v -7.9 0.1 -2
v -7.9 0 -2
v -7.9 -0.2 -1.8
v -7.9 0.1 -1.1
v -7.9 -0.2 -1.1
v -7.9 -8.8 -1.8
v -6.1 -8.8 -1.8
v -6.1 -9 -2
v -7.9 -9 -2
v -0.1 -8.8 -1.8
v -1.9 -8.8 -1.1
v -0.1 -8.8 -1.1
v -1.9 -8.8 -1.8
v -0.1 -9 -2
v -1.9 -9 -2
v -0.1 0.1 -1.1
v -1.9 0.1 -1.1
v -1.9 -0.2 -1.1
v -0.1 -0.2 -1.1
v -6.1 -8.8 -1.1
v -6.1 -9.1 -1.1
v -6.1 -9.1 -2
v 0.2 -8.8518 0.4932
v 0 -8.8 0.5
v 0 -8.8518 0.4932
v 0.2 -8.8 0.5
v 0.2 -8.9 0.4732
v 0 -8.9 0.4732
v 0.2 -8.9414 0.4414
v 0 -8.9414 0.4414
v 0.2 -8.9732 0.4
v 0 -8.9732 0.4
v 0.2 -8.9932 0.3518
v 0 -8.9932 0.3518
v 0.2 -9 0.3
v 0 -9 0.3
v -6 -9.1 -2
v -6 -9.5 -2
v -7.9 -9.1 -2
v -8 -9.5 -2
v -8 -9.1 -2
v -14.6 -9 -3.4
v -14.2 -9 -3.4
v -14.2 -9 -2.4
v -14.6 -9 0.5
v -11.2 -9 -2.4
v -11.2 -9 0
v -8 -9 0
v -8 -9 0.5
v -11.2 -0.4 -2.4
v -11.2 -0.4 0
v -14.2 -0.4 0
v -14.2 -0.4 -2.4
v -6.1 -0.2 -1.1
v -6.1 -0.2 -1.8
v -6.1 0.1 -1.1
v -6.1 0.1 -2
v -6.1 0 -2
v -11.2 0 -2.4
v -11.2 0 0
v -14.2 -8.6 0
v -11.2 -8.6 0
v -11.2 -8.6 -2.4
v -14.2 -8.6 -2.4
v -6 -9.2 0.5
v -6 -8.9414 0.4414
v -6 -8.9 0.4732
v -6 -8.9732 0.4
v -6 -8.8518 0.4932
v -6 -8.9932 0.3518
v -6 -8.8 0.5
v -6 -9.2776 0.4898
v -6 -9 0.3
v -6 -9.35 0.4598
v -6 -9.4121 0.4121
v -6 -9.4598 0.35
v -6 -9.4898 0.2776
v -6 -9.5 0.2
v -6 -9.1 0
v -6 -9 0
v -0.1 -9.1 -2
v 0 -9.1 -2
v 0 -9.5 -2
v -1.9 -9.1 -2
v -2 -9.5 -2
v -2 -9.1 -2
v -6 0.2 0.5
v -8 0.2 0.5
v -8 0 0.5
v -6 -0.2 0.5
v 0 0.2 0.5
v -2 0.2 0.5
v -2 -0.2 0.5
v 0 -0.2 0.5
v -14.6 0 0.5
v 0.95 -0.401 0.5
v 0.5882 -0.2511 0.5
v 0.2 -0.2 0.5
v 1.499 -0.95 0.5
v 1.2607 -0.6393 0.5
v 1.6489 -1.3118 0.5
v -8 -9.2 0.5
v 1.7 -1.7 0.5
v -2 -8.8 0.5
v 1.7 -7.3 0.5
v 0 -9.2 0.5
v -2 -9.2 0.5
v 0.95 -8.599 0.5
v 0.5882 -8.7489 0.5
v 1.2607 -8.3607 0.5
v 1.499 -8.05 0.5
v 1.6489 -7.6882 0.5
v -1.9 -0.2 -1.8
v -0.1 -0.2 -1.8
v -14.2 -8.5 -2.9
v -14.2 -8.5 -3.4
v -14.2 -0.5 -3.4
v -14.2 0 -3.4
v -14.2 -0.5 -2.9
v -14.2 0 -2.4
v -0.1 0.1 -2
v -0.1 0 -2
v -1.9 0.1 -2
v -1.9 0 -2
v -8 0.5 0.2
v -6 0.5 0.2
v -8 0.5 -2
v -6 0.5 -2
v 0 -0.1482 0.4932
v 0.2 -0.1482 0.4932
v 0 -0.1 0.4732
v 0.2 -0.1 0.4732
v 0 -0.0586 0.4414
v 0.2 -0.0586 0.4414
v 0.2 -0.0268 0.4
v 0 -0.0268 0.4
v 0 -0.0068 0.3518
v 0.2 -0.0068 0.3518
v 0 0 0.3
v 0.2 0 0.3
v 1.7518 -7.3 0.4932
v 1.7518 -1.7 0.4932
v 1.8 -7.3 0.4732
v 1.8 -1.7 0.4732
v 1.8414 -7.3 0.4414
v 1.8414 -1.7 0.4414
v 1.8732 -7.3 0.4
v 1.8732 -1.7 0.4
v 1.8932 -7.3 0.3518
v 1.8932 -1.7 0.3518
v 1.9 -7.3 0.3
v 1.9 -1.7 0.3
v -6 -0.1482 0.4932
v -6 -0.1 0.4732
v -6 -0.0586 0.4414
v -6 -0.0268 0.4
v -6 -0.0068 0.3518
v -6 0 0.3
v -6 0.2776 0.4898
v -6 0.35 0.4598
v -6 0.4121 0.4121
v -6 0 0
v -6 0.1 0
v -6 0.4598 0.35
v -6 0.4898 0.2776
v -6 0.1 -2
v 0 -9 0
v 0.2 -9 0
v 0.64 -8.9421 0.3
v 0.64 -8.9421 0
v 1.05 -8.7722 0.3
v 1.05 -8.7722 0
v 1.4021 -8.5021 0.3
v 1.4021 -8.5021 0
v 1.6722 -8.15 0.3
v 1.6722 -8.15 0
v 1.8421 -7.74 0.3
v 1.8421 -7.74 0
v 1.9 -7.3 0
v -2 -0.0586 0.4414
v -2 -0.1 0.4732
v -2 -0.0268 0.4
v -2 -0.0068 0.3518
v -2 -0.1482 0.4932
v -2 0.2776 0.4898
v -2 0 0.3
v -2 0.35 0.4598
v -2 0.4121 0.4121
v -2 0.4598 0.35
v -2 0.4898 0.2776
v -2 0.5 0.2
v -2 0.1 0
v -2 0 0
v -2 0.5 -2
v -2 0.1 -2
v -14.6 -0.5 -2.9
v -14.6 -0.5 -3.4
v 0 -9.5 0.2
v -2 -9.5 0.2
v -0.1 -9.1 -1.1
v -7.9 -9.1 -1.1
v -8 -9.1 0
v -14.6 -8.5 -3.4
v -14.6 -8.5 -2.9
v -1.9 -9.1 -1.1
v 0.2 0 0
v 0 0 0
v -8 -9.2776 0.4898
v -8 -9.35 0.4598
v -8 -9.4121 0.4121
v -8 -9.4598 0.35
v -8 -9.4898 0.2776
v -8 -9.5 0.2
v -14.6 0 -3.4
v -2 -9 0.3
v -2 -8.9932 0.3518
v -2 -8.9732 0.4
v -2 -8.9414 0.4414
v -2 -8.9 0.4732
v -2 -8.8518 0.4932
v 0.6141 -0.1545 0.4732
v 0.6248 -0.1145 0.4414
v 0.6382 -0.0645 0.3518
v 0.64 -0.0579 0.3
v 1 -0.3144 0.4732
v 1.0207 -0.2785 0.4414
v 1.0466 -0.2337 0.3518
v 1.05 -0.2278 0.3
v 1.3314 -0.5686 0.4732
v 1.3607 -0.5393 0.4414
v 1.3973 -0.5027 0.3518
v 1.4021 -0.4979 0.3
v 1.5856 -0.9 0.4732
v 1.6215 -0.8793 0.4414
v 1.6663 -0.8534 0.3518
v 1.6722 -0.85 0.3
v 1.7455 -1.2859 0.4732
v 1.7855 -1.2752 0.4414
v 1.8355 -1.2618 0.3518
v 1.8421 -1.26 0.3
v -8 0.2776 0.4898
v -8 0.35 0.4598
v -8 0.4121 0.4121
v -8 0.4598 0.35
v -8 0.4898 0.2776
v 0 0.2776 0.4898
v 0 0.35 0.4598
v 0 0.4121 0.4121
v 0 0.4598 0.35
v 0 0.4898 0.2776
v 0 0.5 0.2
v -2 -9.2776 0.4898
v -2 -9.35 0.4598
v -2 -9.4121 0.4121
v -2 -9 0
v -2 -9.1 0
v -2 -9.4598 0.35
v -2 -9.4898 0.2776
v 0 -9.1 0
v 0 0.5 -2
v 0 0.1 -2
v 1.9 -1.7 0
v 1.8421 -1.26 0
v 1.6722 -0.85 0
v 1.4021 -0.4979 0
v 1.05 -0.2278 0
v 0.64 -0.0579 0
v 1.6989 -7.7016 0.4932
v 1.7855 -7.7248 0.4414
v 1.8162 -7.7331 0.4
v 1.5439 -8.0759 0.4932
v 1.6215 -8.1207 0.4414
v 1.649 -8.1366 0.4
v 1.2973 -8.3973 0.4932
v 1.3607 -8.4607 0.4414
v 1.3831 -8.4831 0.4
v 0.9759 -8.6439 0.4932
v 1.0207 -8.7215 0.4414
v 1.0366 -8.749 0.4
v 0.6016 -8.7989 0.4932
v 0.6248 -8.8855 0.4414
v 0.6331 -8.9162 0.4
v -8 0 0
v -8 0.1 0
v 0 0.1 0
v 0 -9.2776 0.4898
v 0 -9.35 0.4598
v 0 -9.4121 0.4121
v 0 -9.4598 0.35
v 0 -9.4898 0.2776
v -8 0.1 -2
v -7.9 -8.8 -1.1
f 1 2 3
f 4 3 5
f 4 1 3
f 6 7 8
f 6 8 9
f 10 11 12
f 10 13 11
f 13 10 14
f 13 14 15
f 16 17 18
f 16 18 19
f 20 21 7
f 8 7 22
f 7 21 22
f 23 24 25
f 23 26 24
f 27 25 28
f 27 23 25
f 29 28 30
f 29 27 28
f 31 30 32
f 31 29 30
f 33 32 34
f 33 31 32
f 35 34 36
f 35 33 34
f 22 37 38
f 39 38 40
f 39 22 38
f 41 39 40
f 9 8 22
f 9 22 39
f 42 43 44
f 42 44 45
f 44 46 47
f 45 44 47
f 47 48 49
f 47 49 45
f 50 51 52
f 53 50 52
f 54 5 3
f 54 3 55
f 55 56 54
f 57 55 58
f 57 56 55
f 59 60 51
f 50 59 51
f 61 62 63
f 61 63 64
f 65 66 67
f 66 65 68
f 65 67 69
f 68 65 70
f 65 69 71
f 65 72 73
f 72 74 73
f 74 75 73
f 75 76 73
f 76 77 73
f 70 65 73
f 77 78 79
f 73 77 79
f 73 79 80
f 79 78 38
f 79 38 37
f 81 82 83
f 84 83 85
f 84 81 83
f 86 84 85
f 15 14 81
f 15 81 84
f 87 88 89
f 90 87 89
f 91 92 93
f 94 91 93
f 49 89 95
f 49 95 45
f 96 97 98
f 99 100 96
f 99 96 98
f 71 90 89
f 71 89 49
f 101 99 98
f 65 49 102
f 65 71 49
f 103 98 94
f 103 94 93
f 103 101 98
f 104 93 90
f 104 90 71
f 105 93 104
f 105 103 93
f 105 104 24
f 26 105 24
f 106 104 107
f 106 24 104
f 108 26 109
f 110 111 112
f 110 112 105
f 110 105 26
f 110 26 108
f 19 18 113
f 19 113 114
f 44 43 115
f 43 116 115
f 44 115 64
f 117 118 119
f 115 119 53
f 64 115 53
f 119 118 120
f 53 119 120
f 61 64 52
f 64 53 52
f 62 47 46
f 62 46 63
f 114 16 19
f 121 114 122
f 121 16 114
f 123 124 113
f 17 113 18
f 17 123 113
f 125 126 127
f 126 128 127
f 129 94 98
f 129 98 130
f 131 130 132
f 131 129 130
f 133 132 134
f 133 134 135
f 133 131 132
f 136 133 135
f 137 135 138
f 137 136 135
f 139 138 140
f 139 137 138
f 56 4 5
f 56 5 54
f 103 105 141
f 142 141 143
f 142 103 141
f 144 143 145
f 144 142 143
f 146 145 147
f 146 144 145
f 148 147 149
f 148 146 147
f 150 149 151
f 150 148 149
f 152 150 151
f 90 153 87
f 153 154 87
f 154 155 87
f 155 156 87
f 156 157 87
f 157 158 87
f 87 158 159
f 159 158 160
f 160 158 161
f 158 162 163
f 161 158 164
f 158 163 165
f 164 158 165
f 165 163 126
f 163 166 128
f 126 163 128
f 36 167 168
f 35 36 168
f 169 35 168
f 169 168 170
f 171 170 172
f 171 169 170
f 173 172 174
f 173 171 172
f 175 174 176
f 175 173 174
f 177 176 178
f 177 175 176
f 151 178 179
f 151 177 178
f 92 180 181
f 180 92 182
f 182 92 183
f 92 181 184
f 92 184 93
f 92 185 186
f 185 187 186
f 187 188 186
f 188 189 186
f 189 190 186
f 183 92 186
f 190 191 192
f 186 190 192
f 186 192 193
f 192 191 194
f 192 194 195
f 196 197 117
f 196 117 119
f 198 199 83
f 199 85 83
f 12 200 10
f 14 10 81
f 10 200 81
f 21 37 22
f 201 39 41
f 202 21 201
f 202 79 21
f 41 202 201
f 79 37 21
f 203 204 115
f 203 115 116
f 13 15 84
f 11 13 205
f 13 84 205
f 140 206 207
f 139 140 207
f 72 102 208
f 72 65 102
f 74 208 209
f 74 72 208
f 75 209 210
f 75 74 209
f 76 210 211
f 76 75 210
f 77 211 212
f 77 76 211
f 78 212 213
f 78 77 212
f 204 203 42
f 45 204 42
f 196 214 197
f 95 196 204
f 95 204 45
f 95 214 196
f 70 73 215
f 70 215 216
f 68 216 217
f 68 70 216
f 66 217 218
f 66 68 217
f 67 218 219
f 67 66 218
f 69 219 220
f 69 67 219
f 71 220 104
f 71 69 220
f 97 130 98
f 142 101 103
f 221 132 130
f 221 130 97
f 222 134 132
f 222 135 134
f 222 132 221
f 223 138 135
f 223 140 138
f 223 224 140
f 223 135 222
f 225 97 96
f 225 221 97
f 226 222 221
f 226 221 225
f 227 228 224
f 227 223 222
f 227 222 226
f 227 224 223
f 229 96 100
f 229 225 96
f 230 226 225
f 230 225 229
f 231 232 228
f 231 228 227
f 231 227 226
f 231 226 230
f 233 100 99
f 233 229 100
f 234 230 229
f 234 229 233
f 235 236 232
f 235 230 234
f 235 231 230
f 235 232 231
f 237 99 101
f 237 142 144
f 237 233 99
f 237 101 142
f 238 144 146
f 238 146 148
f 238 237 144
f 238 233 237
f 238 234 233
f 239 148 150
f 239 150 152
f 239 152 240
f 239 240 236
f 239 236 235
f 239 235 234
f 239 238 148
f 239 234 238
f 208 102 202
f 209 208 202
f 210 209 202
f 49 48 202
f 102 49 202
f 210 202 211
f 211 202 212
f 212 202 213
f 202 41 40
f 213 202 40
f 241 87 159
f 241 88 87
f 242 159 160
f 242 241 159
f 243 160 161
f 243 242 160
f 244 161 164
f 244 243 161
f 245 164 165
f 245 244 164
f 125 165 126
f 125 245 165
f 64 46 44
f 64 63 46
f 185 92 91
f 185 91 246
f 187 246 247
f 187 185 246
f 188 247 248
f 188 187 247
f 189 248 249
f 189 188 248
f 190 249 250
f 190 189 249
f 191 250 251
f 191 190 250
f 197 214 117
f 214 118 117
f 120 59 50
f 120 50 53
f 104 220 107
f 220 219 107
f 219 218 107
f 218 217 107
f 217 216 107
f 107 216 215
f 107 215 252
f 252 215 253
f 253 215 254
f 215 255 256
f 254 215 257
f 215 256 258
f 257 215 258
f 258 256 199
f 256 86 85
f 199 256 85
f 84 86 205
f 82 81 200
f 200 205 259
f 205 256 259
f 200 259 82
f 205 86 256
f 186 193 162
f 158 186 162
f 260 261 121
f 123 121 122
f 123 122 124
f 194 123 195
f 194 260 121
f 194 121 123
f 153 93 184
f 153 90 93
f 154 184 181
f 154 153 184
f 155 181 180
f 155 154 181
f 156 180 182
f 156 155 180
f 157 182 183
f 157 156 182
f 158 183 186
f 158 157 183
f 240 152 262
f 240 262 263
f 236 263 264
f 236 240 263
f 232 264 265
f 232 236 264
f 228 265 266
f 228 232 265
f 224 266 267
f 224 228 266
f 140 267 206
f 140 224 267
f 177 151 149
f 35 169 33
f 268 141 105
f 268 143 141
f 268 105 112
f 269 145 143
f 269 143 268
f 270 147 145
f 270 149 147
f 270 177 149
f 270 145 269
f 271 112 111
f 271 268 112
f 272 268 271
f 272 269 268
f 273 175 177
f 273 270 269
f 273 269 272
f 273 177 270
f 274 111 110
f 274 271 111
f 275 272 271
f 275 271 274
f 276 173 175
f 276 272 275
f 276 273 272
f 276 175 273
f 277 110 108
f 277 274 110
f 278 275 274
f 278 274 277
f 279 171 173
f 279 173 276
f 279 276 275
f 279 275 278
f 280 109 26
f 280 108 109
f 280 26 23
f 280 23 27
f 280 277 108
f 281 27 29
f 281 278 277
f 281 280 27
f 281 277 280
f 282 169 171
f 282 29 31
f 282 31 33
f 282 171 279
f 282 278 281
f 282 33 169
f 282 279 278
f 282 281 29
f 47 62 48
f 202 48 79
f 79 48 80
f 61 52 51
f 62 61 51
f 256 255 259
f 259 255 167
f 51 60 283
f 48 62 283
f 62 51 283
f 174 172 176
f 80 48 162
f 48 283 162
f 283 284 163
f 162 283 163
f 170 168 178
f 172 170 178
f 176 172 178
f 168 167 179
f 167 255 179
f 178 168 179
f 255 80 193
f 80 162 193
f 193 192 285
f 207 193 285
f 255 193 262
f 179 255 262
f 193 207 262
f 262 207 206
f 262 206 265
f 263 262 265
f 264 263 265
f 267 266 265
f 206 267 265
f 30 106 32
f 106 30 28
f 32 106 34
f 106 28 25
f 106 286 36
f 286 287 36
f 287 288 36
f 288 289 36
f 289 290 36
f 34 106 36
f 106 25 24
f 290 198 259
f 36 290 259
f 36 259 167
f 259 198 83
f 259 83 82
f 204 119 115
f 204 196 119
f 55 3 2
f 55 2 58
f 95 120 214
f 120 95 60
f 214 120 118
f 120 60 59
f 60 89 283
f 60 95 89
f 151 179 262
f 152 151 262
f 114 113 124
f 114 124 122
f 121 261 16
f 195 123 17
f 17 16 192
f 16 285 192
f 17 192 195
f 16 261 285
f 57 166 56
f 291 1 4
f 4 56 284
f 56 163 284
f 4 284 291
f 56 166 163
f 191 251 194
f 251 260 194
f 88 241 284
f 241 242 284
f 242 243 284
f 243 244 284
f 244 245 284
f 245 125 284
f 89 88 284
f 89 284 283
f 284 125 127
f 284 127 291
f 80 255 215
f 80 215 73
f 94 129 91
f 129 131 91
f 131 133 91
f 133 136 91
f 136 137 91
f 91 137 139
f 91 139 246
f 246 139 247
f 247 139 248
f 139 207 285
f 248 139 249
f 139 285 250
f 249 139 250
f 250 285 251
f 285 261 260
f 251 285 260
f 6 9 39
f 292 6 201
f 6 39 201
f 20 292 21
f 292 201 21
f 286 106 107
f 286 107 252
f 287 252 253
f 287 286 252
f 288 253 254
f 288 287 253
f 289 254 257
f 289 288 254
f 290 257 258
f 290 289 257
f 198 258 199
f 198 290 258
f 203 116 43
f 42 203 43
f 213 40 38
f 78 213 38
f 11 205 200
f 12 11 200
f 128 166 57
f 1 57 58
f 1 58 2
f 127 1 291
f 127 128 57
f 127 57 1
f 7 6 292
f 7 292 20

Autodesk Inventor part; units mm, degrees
ref_plane "Work Plane1" through (-1, 0, 0) normal (0, 0, 1) x (1, 0, 0)
sketch "Sketch1" plane through (-1, 0, 0) normal (0, 0, 1) x (1, 0, 0)
  line L0 (-7, 0) -> (-5, 0)
  line L1 (-5, 0) -> (-5, 0.5)
  line L2 (-5, 0.5) -> (-7, 0.5)
  line L3 (-7, 0.5) -> (-7, 0)
  line L4 (-5, 0) -> (-5, -0.4) projected
  line L5 (-7, 0) -> (-7, -0.4) projected
  line L6 (-1, 0) -> (-1, -0.4) projected
  line L7 (1, 0) -> (1, -0.4) projected
  line L8 (1, -8.6) -> (1, -9) projected
  line L9 (-1, -8.6) -> (-1, -9) projected
  line L10 (-5, -8.6) -> (-5, -9) projected
  line L11 (-7, -8.6) -> (-7, -9) projected
  line L12 (-7, -9.5) -> (-5, -9.5)
  line L13 (-5, -9.5) -> (-5, -9)
  line L14 (-5, -9) -> (-7, -9)
  line L15 (-7, -9) -> (-7, -9.5)
  line L16 (-1, -9.5) -> (1, -9.5)
  line L17 (1, -9.5) -> (1, -9)
  line L18 (1, -9) -> (-1, -9)
  line L19 (-1, -9) -> (-1, -9.5)
  line L20 (-1, 0) -> (1, 0)
  line L21 (1, 0) -> (1, 0.5)
  line L22 (1, 0.5) -> (-1, 0.5)
  line L23 (-1, 0.5) -> (-1, 0)
  line L24 (2.4038, -9) -> (-10, -9) projected
  line L25 (2.4038, 0) -> (-10, 0) projected
  line L26 (-13.2, -9) -> (2.9, -9)
  line L27 (2.9, -9) -> (2.9, 0)
  line L28 (2.9, 0) -> (-13.2, 0)
  line L29 (-13.2, 0) -> (-13.2, -9)
  line L30 (2.7, -2.7) -> (2.7, -1.9958) projected
  line L31 (-13, -9) -> (-13, -5.4522) projected
  point P0 (0.7, -9)
  point P1 (1, 0)
  point P2 (-1, 0)
  point P3 (-5, 0)
  point P4 (-7, 0)
  point P5 (1, 0)
  dimension "d89" = 0.5
  dimension "d90" = 0.2
  dimension "d125" = 0.2
extrude "main" add sketch "Sketch1" along normal blind 0.5
sketch "Sketch2" plane through (-1, 0, 0) normal (0, 0, -1) x (-1, 0, 0)
  line L0 (13, 0) -> (-2.4038, 0) projected
  line L1 (-2.4038, -9) -> (13, -9) projected
  line L2 (7, 0.5) -> (7, 0) projected
  line L3 (5, 0) -> (5, 0.5) projected
  line L4 (-1, 0) -> (-1, 0.5) projected
  line L5 (1, 0.5) -> (-1, 0.5)
  line L6 (-1, 0.5) -> (-1, 0.1)
  line L7 (-1, 0.1) -> (1, 0.1)
  line L8 (1, 0.1) -> (1, 0.5)
  line L9 (7, -9) -> (7, -9.5) projected
  line L10 (7, -9.5) -> (5, -9.5)
  line L11 (5, -9.5) -> (5, -9.1)
  line L12 (5, -9.1) -> (7, -9.1)
  line L13 (7, -9.1) -> (7, -9.5)
  line L14 (-1, -9.5) -> (-1, -9) projected
  line L15 (1, -9) -> (1, -9.5) projected
  line L16 (-1, -9.5) -> (1, -9.5)
  line L17 (1, -9.5) -> (1, -9.1)
  line L18 (1, -9.1) -> (-1, -9.1)
  line L19 (-1, -9.1) -> (-1, -9.5)
  line L20 (5, 0.5) -> (7, 0.5) projected
  line L21 (7, 0.5) -> (5, 0.5)
  line L22 (5, 0.5) -> (5, 0.1)
  line L23 (5, 0.1) -> (7, 0.1)
  line L24 (7, 0.1) -> (7, 0.5)
  line L25 (1, 0.5) -> (1, 0) projected
  line L26 (-1, 0.5) -> (1, 0.5) projected
  point P0 (1, -9.5)
  point P1 (-1, -9.1)
  point P2 (-1, 0.5)
  dimension "d91" = 0.1
  dimension "d92" = 0.1
  dimension "d93" = 0.1
  dimension "d94" = 0.1
extrude "flaps" add sketch "Sketch2" along normal blind 2 contours L23 L3 L20 L2 | L7 L4 L5 L8 | L9 L10 L11 L12 | L18 L15 L16 L14
sketch "Sketch18" plane through (-1, 0, 0) normal (0, 0, -1) x (-1, 0, 0)
  line L0 (7, 0) -> (13.2, 0) projected
  line L1 (13.2, 0) -> (10.2, 0)
  line L2 (10.2, 0) -> (10.2, -0.4)
  line L3 (10.2, -0.4) -> (13.2, -0.4)
  line L4 (13.2, -0.4) -> (13.2, 0)
  line L5 (13.2, -9) -> (7, -9) projected
  line L6 (13.2, -9) -> (10.2, -9)
  line L7 (10.2, -9) -> (10.2, -8.6)
  line L8 (10.2, -8.6) -> (13.2, -8.6)
  line L9 (13.2, -8.6) -> (13.2, -9)
  line L10 (10, 0) -> (10, -0.4) projected
  line L11 (-1.3, -0.4) -> (10, -0.4) projected
  line L12 (-1.3, -8.6) -> (10, -8.6) projected
  point P0 (-1, 0)
  point P1 (10.2, 0)
  dimension "d95" = 0.2
extrude "Extrusion18" add sketch "Sketch18" along normal blind 2.4
ref_plane "Work Plane4" through (-14.2, -9, 0.5) normal (-1, 0, 0) x (0, 0, 1)
sketch "Sketch19" plane through (-14.2, -9, 0.5) normal (-1, 0, 0) x (0, 0, 1)
  line L0 (0, 9) -> (0, 0) projected
  line L1 (0, 9) -> (-3.9, 9)
  line L2 (-3.9, 9) -> (-3.9, 0)
  line L3 (-3.9, 0) -> (0, 0)
  line L4 (0, 0) -> (0, 9)
  line L5 (-3.9, 8.5) -> (-3.9, 0.5) projected
extrude "Extrusion19" add sketch "Sketch19" along normal blind 0.4
fillet "Fillet7" radius 0.3 4 edges at (-1, -9.5, 0.5) (-1, 0.5, 0.5) (-7, 0.5, 0.5) (-7, -9.5, 0.5)
fillet "Fillet9" radius 1.7 2 edges at (1.9, 0, 0.25) (1.9, -9, 0.25)
sketch "Sketch22" plane through (-8, -9.1, 0) normal (0, 1, 0) x (1, 0, 0)
  line L0 (0, 0.9) -> (2, 0.9) projected
  line L1 (0, 2.1) -> (0, 0.9) projected
  line L2 (2, 0.9) -> (2, 2.1) projected
  line L3 (6, 0.9) -> (8, 0.9) projected
  line L4 (8, 0.9) -> (8, 2.1) projected
  line L5 (6, 2.1) -> (8, 2.1) projected
  line L6 (6, 2.1) -> (6, 0.9) projected
  line L7 (2, 2.1) -> (0, 2.1) projected
  line L8 (0.1, 1.1) -> (1.9, 1.1)
  line L9 (1.9, 1.1) -> (1.9, 2)
  line L10 (1.9, 2) -> (0.1, 2)
  line L11 (0.1, 2) -> (0.1, 1.1)
  line L12 (6.1, 1.1) -> (7.9, 1.1)
  line L13 (7.9, 1.1) -> (7.9, 2)
  line L14 (7.9, 2) -> (6.1, 2)
  line L15 (6.1, 2) -> (6.1, 1.1)
  point P0 (8, 0)
  dimension "d134" = 0.1
  dimension "d135" = 0.2
  dimension "d136" = 0.1
  dimension "d137" = 0.1
  dimension "d138" = 0.1
  dimension "d139" = 0.1
  dimension "d140" = 0.1
extrude "Extrusion22" add sketch "Sketch22" along normal blind 0.3 contours L11 L10 L9 L8 | L15 L14 L13 L12
sketch "Sketch23" plane through (-2, 0.1, 0) normal (0, -1, 0) x (1, 0, 0)
  line L0 (1.9, -2) -> (0.1, -2) projected
  line L1 (0.1, -1.1) -> (1.9, -1.1) projected
  line L2 (0.1, -2) -> (0.1, -1.1) projected
  line L3 (1.9, -1.1) -> (1.9, -2) projected
  line L4 (-4.1, -1.1) -> (-4.1, -2) projected
  line L5 (-4.1, -2) -> (-5.9, -2) projected
  line L6 (-5.9, -1.1) -> (-4.1, -1.1) projected
  line L7 (-5.9, -2) -> (-5.9, -1.1) projected
  point P0 (2, 0)
extrude "Extrusion23" add sketch "Sketch23" along normal blind 0.3
chamfer "Chamfer6" distance 0.2 angle 45 4 edges at (-1, -8.8, -2) (-7, -8.8, -2) (-7, -0.2, -2) (-1, -0.2, -2)
fillet "Fillet11" radius 0.2 5 edges at (1.4021, -0.4979, 0.5) (1.4021, -8.5021, 0.5) (1.9, -4.5, 0.5) (-4, -9, 0.5) (-4, 0, 0.5)
sketch "Sketch9" plane through (-1, 0, 0.5) normal (0, 0, 1) x (1, 0, 0)
  line L0 (-15.2, -10) -> (-9.8, -10)
  line L1 (-9.8, -10) -> (-9.8, 1)
  line L2 (-9.8, 1) -> (-15.2, 1)
  line L3 (-15.2, 1) -> (-15.2, -10)
  line L4 (-13.2, 0) -> (-13.2, -9) projected
  line L5 (-13.2, -9) -> (-7, -9) construction
  line L6 (-7, -9) -> (-7, -10) construction
  line L7 (-7, 0.1) -> (-7, 0) construction
  line L8 (-7, 0) -> (-7, 1) construction
  point P0 (1, 0)
  dimension "d100" = 5.4
  dimension "d101" = 11
  dimension "d102" = 2
ref_plane "Work Plane3" through (-10.8, -9.5, 0.5) normal (1, 0, 0) x (0, 0, -1)
sketch "Sketch20" plane through (-10.8, -9.5, 0.5) normal (1, 0, 0) x (0, 0, -1)
  line L0 (-0.925, -0.1) -> (-0.275, -0.1)
  line L1 (-0.275, -0.1) -> (-0.275, 10.1)
  line L2 (-0.275, 10.1) -> (-0.925, 10.1)
  line L3 (-0.925, 10.1) -> (-0.925, -0.1)
  line L4 (0, -0.5) -> (-1.2, -0.5) construction
  line L5 (0, 10.5) -> (-1.2, 10.5) construction
  line L6 (-1.2, -0.5) -> (-1.2, 10.5) construction
  point P0 (0.5, 9.5)
  point P1 (0.4, -0.5)
  point P2 (0.4, 10.5)
  dimension "d105" = 0.275
  dimension "d106" = 0.65
  dimension "d107" = 0.4
  dimension "d108" = 0.4
sketch "Sketch24" plane through (-14.6, -9, 0.5) normal (-1, 0, 0) x (0, 0, 1)
  line L0 (-4.7023, 8.5) -> (-3.4, 8.5)
  line L1 (-3.4, 8.5) -> (-3.4, 0.5)
  line L2 (-3.4, 0.5) -> (-4.7023, 0.5)
  line L3 (-4.7023, 0.5) -> (-4.7023, 8.5)
  line L4 (0, 0) -> (0, 9) projected
  line L5 (0, 9) -> (-3.9, 9) projected
  line L6 (-3.9, 9) -> (-3.9, 0) projected
  line L7 (-3.9, 0) -> (0, 0) projected
  point P0 (-0.5, 9)
  point P1 (-4.0512, 8.5)
  dimension "d152" = 8
  dimension "d153" = 0.5
  dimension "d154" = 0.5
extrude "Extrusion24" cut sketch "Sketch24" against normal blind 10 contours L0 L6 L2 L3 | L0 L1 L2 L6
properties part number "np2alpha_cap_flex_top"
